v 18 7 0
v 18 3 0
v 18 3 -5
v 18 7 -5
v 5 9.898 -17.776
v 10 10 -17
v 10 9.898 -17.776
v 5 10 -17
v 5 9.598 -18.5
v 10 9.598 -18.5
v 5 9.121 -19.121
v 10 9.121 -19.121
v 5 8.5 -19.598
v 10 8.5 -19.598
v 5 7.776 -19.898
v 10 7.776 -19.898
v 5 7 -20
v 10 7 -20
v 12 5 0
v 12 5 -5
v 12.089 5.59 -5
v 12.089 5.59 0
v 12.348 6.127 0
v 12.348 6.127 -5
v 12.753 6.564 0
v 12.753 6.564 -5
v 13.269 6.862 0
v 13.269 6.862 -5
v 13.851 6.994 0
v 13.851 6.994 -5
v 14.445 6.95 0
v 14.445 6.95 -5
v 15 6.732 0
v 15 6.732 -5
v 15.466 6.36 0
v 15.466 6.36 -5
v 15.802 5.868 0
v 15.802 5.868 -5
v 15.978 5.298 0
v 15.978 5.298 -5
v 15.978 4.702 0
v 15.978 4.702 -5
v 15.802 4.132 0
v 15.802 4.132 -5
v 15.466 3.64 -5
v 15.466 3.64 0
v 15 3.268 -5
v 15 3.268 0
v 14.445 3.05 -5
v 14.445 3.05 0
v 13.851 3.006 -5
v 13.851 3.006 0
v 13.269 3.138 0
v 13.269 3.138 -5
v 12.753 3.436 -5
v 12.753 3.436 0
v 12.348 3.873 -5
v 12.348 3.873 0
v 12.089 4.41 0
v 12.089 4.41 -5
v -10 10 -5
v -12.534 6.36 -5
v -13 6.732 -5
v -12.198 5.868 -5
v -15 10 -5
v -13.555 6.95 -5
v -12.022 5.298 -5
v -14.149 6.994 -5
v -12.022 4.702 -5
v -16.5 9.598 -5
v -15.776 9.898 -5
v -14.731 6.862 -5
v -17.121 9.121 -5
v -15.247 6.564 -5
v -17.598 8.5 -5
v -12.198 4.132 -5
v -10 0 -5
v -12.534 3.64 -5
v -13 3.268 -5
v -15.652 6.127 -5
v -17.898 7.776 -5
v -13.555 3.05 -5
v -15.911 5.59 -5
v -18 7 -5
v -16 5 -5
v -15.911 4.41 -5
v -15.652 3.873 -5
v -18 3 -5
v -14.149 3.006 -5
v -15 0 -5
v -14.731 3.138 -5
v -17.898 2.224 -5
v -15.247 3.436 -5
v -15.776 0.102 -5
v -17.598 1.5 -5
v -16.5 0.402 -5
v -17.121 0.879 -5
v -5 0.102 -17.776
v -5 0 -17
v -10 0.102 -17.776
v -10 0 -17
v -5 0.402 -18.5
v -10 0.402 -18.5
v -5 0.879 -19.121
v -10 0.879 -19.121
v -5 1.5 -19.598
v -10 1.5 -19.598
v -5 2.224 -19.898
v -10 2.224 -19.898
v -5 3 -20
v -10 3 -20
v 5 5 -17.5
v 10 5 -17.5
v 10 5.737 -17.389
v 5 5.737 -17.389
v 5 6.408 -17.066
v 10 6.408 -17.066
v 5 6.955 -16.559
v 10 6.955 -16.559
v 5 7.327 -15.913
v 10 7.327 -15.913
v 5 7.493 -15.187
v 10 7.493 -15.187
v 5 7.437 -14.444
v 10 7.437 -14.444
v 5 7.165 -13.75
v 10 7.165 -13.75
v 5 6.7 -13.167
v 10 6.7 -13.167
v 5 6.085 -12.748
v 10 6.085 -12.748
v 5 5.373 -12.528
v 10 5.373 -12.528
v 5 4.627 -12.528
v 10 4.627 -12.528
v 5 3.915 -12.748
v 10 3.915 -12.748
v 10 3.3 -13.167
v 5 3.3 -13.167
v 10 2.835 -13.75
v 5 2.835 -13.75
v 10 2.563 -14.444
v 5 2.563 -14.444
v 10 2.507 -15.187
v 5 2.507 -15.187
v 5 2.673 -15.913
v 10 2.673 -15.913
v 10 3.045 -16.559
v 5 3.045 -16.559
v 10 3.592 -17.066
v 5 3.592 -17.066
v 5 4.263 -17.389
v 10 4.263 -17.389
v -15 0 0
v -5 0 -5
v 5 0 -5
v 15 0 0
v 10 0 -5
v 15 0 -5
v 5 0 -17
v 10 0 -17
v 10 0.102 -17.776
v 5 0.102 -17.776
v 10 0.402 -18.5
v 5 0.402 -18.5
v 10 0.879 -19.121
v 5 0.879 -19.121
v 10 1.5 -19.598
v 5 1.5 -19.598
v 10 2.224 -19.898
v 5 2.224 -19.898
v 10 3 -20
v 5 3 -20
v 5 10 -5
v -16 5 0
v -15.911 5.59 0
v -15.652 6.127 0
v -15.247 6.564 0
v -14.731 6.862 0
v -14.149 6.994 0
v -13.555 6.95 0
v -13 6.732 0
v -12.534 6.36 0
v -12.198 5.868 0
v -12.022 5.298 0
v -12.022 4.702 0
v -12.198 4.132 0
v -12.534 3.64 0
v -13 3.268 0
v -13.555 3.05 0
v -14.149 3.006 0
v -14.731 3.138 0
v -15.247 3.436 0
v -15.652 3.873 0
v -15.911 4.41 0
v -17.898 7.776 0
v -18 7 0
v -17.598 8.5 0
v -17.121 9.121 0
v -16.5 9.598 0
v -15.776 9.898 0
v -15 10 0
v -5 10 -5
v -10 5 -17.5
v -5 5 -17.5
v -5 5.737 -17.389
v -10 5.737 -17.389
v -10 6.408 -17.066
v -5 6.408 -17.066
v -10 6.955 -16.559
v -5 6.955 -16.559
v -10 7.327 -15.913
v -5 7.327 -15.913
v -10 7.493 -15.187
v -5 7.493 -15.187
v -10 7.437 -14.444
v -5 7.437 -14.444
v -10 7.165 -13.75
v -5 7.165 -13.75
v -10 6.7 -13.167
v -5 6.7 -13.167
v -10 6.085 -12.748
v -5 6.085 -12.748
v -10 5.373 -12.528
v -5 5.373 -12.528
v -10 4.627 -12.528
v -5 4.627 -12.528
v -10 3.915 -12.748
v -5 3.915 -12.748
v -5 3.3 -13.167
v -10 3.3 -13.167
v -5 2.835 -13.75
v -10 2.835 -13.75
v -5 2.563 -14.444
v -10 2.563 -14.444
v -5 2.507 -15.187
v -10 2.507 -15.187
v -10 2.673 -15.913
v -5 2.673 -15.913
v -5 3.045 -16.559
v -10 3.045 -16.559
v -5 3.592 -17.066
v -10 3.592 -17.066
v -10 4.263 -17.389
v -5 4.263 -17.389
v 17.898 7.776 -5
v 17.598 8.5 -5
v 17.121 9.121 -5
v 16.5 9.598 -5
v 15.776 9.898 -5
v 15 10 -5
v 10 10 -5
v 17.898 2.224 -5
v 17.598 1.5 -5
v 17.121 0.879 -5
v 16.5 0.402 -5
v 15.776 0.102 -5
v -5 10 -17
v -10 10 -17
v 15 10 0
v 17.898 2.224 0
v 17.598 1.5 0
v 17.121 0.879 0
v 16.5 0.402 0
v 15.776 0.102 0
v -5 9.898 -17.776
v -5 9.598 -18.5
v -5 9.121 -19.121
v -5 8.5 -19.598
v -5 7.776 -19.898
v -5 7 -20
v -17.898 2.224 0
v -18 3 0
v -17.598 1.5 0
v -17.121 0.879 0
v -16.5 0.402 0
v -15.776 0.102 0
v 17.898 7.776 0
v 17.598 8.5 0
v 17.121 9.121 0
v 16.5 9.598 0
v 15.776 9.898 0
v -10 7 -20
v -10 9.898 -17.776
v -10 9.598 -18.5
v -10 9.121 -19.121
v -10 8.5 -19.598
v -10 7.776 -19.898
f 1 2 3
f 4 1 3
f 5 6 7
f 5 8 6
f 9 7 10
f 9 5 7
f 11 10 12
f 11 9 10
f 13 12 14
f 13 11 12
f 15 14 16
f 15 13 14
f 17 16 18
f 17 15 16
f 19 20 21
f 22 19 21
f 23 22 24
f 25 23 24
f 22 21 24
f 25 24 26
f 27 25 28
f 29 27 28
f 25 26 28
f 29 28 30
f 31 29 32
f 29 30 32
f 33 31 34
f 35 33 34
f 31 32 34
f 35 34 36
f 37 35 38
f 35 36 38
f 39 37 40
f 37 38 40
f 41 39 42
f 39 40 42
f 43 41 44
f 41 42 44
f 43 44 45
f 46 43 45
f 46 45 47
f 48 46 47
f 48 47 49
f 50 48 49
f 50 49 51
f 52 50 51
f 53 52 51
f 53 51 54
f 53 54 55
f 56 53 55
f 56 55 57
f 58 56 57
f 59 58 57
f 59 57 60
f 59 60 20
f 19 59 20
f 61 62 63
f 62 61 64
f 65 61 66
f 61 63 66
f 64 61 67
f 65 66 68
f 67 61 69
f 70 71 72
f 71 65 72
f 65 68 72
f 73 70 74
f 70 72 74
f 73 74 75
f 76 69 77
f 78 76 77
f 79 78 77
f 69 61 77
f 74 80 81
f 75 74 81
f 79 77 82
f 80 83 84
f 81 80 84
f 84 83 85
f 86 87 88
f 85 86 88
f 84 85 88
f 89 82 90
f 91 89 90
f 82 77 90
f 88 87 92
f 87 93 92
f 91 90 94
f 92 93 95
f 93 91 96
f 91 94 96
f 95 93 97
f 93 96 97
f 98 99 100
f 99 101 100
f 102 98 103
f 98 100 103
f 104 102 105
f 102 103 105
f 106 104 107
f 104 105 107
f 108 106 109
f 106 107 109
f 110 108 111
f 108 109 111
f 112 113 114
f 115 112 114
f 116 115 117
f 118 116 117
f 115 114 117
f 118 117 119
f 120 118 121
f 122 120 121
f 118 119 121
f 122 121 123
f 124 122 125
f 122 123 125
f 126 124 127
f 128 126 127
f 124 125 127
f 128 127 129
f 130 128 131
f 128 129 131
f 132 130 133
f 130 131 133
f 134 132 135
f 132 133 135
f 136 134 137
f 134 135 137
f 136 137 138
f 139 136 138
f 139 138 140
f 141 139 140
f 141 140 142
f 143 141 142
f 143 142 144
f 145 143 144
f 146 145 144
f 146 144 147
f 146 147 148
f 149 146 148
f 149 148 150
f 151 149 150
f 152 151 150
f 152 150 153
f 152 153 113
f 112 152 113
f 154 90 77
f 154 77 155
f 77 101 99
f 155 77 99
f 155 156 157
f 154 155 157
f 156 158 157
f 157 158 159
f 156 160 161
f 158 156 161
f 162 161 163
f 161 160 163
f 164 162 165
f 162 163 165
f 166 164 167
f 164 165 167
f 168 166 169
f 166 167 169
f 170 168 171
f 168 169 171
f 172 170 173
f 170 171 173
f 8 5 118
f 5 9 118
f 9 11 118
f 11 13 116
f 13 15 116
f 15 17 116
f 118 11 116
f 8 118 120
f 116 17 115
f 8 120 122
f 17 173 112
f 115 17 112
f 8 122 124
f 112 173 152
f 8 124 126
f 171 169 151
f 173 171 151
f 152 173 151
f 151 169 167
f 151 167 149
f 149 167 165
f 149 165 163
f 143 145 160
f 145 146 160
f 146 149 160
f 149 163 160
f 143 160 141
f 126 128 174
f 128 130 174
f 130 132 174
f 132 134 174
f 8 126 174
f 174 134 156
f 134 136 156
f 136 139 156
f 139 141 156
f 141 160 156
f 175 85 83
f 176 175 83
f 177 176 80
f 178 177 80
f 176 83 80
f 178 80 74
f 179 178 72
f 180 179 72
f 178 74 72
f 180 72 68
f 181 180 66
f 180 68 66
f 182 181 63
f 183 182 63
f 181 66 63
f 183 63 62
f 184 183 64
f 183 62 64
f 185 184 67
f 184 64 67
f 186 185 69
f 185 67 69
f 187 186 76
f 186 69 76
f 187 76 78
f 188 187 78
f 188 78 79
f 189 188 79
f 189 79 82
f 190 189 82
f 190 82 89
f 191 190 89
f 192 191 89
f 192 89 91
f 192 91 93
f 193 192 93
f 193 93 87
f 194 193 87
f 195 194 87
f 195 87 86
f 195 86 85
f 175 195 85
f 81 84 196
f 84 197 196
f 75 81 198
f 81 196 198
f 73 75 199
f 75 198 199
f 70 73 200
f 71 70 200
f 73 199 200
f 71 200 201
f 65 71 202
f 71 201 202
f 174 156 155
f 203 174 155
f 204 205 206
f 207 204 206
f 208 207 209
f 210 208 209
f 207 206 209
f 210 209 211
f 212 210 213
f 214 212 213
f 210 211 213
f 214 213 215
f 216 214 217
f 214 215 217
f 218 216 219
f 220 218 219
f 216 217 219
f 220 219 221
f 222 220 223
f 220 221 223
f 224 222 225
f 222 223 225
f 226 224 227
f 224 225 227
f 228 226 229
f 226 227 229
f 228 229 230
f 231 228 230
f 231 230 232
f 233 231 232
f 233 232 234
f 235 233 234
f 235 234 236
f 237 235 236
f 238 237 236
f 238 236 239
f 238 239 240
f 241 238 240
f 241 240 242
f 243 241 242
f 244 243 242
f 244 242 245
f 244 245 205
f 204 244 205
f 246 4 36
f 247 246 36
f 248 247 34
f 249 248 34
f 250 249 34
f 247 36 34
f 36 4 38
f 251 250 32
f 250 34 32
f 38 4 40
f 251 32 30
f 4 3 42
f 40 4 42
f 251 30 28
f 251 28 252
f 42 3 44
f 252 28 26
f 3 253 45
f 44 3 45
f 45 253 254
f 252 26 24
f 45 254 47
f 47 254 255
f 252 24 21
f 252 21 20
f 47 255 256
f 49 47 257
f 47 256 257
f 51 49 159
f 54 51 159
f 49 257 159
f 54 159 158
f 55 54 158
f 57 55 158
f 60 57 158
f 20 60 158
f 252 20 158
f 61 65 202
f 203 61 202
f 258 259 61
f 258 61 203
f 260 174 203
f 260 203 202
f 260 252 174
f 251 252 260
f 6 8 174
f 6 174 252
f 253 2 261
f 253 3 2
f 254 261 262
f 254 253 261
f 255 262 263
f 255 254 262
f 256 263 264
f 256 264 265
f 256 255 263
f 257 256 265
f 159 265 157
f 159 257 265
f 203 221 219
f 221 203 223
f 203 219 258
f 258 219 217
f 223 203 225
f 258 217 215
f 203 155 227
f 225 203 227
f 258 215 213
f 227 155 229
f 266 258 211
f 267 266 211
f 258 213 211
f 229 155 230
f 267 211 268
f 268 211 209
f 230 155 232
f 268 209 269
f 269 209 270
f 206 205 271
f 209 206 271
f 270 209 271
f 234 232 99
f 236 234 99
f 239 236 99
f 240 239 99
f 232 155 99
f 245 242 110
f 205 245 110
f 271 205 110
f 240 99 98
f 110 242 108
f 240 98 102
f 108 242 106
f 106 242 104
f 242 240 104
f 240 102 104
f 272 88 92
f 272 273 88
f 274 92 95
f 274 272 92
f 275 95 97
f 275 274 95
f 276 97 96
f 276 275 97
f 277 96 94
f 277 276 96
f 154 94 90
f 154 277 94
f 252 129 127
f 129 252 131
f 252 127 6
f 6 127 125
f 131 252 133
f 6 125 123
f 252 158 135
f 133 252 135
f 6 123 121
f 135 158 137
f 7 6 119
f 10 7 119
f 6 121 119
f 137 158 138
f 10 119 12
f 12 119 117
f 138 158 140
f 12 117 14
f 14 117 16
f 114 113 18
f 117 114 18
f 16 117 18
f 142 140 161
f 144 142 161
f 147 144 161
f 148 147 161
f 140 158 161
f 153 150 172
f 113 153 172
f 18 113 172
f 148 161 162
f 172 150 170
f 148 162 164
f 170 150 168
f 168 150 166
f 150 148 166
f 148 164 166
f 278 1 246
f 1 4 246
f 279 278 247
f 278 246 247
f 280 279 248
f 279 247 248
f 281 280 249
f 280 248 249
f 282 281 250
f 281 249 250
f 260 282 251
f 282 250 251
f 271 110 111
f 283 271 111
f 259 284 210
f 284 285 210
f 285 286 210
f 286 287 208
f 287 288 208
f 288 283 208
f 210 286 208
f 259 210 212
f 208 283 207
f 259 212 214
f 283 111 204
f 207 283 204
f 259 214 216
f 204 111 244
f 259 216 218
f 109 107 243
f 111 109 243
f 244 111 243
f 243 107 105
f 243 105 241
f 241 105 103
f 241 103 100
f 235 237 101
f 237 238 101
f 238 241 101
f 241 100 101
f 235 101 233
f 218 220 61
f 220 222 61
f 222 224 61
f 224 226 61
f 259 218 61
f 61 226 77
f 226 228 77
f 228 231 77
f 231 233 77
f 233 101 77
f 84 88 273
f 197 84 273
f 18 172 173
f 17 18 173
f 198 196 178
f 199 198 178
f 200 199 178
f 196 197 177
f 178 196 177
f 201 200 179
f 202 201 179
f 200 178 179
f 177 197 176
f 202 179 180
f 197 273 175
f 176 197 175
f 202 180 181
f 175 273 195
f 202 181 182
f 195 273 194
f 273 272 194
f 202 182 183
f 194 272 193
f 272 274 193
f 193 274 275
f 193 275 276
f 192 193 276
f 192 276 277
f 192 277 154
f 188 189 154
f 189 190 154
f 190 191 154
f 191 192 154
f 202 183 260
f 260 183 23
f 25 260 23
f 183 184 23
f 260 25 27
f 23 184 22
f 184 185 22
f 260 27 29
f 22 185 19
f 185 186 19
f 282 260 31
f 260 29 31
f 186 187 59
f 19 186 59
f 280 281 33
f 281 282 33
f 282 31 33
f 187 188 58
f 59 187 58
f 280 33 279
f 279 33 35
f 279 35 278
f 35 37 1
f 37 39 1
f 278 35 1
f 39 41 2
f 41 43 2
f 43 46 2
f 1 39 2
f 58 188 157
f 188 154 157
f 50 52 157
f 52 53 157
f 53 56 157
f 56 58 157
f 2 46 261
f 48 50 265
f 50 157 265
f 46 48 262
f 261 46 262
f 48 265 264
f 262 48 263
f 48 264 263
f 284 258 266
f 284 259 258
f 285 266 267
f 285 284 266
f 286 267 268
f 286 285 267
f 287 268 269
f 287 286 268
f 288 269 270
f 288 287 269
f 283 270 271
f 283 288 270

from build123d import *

# Parameters (mm, degrees)
BOSS_EXTRUDE1_DEPTH = 10
SKETCH2_R           = 2.5
CUT_EXTRUDE1_DEPTH  = 36.832945734
FILLET1_R           = 3
SKETCH3_R           = 2
CUT_EXTRUDE2_DEPTH  = 26.475478406


with BuildPart() as part:
    # Sketch1 → Boss-Extrude1 (new body)
    with BuildSketch(Plane(origin=(0, 0, 0), x_dir=(1, 0, 0), z_dir=(0, 1, 0))):
        Polygon((-18, 0), (18, 0), (18, 5), (10, 5), (10, 20), (5, 20), (5, 5), (-5, 5), (-5, 20), (-10, 20), (-10, 5), (-18, 5), align=None)
    extrude(amount=BOSS_EXTRUDE1_DEPTH)

    # Sketch2 → Cut-Extrude1 (cut, through all)
    with BuildSketch(Plane(origin=(10, 0, 0), x_dir=(0, 0, -1), z_dir=(1, 0, 0))):
        with Locations((15, 5)):
            Circle(SKETCH2_R)
    extrude(amount=-CUT_EXTRUDE1_DEPTH, mode=Mode.SUBTRACT)

    # Fillet1
    fillet1_edges = [part.edges().sort_by_distance(p)[0] for p in [
        (18, 0, -2.5),
        (7.5, 10, -20),
        (-18, 0, -2.5),
        (-7.5, 0, -20),
        (7.5, 0, -20),
        (-7.5, 10, -20),
        (-18, 10, -2.5),
        (18, 10, -2.5),
    ]]
    fillet(fillet1_edges, radius=FILLET1_R)

    # Sketch3 → Cut-Extrude2 (cut, through all)
    with BuildSketch(Plane(origin=(0, 0, -5), x_dir=(-1, 0, 0), z_dir=(0, 0, -1))):
        with Locations((14, 5)):
            Circle(SKETCH3_R)
        with Locations((-14, 5)):
            Circle(SKETCH3_R)
    extrude(amount=-CUT_EXTRUDE2_DEPTH, mode=Mode.SUBTRACT)


solid = part.part
